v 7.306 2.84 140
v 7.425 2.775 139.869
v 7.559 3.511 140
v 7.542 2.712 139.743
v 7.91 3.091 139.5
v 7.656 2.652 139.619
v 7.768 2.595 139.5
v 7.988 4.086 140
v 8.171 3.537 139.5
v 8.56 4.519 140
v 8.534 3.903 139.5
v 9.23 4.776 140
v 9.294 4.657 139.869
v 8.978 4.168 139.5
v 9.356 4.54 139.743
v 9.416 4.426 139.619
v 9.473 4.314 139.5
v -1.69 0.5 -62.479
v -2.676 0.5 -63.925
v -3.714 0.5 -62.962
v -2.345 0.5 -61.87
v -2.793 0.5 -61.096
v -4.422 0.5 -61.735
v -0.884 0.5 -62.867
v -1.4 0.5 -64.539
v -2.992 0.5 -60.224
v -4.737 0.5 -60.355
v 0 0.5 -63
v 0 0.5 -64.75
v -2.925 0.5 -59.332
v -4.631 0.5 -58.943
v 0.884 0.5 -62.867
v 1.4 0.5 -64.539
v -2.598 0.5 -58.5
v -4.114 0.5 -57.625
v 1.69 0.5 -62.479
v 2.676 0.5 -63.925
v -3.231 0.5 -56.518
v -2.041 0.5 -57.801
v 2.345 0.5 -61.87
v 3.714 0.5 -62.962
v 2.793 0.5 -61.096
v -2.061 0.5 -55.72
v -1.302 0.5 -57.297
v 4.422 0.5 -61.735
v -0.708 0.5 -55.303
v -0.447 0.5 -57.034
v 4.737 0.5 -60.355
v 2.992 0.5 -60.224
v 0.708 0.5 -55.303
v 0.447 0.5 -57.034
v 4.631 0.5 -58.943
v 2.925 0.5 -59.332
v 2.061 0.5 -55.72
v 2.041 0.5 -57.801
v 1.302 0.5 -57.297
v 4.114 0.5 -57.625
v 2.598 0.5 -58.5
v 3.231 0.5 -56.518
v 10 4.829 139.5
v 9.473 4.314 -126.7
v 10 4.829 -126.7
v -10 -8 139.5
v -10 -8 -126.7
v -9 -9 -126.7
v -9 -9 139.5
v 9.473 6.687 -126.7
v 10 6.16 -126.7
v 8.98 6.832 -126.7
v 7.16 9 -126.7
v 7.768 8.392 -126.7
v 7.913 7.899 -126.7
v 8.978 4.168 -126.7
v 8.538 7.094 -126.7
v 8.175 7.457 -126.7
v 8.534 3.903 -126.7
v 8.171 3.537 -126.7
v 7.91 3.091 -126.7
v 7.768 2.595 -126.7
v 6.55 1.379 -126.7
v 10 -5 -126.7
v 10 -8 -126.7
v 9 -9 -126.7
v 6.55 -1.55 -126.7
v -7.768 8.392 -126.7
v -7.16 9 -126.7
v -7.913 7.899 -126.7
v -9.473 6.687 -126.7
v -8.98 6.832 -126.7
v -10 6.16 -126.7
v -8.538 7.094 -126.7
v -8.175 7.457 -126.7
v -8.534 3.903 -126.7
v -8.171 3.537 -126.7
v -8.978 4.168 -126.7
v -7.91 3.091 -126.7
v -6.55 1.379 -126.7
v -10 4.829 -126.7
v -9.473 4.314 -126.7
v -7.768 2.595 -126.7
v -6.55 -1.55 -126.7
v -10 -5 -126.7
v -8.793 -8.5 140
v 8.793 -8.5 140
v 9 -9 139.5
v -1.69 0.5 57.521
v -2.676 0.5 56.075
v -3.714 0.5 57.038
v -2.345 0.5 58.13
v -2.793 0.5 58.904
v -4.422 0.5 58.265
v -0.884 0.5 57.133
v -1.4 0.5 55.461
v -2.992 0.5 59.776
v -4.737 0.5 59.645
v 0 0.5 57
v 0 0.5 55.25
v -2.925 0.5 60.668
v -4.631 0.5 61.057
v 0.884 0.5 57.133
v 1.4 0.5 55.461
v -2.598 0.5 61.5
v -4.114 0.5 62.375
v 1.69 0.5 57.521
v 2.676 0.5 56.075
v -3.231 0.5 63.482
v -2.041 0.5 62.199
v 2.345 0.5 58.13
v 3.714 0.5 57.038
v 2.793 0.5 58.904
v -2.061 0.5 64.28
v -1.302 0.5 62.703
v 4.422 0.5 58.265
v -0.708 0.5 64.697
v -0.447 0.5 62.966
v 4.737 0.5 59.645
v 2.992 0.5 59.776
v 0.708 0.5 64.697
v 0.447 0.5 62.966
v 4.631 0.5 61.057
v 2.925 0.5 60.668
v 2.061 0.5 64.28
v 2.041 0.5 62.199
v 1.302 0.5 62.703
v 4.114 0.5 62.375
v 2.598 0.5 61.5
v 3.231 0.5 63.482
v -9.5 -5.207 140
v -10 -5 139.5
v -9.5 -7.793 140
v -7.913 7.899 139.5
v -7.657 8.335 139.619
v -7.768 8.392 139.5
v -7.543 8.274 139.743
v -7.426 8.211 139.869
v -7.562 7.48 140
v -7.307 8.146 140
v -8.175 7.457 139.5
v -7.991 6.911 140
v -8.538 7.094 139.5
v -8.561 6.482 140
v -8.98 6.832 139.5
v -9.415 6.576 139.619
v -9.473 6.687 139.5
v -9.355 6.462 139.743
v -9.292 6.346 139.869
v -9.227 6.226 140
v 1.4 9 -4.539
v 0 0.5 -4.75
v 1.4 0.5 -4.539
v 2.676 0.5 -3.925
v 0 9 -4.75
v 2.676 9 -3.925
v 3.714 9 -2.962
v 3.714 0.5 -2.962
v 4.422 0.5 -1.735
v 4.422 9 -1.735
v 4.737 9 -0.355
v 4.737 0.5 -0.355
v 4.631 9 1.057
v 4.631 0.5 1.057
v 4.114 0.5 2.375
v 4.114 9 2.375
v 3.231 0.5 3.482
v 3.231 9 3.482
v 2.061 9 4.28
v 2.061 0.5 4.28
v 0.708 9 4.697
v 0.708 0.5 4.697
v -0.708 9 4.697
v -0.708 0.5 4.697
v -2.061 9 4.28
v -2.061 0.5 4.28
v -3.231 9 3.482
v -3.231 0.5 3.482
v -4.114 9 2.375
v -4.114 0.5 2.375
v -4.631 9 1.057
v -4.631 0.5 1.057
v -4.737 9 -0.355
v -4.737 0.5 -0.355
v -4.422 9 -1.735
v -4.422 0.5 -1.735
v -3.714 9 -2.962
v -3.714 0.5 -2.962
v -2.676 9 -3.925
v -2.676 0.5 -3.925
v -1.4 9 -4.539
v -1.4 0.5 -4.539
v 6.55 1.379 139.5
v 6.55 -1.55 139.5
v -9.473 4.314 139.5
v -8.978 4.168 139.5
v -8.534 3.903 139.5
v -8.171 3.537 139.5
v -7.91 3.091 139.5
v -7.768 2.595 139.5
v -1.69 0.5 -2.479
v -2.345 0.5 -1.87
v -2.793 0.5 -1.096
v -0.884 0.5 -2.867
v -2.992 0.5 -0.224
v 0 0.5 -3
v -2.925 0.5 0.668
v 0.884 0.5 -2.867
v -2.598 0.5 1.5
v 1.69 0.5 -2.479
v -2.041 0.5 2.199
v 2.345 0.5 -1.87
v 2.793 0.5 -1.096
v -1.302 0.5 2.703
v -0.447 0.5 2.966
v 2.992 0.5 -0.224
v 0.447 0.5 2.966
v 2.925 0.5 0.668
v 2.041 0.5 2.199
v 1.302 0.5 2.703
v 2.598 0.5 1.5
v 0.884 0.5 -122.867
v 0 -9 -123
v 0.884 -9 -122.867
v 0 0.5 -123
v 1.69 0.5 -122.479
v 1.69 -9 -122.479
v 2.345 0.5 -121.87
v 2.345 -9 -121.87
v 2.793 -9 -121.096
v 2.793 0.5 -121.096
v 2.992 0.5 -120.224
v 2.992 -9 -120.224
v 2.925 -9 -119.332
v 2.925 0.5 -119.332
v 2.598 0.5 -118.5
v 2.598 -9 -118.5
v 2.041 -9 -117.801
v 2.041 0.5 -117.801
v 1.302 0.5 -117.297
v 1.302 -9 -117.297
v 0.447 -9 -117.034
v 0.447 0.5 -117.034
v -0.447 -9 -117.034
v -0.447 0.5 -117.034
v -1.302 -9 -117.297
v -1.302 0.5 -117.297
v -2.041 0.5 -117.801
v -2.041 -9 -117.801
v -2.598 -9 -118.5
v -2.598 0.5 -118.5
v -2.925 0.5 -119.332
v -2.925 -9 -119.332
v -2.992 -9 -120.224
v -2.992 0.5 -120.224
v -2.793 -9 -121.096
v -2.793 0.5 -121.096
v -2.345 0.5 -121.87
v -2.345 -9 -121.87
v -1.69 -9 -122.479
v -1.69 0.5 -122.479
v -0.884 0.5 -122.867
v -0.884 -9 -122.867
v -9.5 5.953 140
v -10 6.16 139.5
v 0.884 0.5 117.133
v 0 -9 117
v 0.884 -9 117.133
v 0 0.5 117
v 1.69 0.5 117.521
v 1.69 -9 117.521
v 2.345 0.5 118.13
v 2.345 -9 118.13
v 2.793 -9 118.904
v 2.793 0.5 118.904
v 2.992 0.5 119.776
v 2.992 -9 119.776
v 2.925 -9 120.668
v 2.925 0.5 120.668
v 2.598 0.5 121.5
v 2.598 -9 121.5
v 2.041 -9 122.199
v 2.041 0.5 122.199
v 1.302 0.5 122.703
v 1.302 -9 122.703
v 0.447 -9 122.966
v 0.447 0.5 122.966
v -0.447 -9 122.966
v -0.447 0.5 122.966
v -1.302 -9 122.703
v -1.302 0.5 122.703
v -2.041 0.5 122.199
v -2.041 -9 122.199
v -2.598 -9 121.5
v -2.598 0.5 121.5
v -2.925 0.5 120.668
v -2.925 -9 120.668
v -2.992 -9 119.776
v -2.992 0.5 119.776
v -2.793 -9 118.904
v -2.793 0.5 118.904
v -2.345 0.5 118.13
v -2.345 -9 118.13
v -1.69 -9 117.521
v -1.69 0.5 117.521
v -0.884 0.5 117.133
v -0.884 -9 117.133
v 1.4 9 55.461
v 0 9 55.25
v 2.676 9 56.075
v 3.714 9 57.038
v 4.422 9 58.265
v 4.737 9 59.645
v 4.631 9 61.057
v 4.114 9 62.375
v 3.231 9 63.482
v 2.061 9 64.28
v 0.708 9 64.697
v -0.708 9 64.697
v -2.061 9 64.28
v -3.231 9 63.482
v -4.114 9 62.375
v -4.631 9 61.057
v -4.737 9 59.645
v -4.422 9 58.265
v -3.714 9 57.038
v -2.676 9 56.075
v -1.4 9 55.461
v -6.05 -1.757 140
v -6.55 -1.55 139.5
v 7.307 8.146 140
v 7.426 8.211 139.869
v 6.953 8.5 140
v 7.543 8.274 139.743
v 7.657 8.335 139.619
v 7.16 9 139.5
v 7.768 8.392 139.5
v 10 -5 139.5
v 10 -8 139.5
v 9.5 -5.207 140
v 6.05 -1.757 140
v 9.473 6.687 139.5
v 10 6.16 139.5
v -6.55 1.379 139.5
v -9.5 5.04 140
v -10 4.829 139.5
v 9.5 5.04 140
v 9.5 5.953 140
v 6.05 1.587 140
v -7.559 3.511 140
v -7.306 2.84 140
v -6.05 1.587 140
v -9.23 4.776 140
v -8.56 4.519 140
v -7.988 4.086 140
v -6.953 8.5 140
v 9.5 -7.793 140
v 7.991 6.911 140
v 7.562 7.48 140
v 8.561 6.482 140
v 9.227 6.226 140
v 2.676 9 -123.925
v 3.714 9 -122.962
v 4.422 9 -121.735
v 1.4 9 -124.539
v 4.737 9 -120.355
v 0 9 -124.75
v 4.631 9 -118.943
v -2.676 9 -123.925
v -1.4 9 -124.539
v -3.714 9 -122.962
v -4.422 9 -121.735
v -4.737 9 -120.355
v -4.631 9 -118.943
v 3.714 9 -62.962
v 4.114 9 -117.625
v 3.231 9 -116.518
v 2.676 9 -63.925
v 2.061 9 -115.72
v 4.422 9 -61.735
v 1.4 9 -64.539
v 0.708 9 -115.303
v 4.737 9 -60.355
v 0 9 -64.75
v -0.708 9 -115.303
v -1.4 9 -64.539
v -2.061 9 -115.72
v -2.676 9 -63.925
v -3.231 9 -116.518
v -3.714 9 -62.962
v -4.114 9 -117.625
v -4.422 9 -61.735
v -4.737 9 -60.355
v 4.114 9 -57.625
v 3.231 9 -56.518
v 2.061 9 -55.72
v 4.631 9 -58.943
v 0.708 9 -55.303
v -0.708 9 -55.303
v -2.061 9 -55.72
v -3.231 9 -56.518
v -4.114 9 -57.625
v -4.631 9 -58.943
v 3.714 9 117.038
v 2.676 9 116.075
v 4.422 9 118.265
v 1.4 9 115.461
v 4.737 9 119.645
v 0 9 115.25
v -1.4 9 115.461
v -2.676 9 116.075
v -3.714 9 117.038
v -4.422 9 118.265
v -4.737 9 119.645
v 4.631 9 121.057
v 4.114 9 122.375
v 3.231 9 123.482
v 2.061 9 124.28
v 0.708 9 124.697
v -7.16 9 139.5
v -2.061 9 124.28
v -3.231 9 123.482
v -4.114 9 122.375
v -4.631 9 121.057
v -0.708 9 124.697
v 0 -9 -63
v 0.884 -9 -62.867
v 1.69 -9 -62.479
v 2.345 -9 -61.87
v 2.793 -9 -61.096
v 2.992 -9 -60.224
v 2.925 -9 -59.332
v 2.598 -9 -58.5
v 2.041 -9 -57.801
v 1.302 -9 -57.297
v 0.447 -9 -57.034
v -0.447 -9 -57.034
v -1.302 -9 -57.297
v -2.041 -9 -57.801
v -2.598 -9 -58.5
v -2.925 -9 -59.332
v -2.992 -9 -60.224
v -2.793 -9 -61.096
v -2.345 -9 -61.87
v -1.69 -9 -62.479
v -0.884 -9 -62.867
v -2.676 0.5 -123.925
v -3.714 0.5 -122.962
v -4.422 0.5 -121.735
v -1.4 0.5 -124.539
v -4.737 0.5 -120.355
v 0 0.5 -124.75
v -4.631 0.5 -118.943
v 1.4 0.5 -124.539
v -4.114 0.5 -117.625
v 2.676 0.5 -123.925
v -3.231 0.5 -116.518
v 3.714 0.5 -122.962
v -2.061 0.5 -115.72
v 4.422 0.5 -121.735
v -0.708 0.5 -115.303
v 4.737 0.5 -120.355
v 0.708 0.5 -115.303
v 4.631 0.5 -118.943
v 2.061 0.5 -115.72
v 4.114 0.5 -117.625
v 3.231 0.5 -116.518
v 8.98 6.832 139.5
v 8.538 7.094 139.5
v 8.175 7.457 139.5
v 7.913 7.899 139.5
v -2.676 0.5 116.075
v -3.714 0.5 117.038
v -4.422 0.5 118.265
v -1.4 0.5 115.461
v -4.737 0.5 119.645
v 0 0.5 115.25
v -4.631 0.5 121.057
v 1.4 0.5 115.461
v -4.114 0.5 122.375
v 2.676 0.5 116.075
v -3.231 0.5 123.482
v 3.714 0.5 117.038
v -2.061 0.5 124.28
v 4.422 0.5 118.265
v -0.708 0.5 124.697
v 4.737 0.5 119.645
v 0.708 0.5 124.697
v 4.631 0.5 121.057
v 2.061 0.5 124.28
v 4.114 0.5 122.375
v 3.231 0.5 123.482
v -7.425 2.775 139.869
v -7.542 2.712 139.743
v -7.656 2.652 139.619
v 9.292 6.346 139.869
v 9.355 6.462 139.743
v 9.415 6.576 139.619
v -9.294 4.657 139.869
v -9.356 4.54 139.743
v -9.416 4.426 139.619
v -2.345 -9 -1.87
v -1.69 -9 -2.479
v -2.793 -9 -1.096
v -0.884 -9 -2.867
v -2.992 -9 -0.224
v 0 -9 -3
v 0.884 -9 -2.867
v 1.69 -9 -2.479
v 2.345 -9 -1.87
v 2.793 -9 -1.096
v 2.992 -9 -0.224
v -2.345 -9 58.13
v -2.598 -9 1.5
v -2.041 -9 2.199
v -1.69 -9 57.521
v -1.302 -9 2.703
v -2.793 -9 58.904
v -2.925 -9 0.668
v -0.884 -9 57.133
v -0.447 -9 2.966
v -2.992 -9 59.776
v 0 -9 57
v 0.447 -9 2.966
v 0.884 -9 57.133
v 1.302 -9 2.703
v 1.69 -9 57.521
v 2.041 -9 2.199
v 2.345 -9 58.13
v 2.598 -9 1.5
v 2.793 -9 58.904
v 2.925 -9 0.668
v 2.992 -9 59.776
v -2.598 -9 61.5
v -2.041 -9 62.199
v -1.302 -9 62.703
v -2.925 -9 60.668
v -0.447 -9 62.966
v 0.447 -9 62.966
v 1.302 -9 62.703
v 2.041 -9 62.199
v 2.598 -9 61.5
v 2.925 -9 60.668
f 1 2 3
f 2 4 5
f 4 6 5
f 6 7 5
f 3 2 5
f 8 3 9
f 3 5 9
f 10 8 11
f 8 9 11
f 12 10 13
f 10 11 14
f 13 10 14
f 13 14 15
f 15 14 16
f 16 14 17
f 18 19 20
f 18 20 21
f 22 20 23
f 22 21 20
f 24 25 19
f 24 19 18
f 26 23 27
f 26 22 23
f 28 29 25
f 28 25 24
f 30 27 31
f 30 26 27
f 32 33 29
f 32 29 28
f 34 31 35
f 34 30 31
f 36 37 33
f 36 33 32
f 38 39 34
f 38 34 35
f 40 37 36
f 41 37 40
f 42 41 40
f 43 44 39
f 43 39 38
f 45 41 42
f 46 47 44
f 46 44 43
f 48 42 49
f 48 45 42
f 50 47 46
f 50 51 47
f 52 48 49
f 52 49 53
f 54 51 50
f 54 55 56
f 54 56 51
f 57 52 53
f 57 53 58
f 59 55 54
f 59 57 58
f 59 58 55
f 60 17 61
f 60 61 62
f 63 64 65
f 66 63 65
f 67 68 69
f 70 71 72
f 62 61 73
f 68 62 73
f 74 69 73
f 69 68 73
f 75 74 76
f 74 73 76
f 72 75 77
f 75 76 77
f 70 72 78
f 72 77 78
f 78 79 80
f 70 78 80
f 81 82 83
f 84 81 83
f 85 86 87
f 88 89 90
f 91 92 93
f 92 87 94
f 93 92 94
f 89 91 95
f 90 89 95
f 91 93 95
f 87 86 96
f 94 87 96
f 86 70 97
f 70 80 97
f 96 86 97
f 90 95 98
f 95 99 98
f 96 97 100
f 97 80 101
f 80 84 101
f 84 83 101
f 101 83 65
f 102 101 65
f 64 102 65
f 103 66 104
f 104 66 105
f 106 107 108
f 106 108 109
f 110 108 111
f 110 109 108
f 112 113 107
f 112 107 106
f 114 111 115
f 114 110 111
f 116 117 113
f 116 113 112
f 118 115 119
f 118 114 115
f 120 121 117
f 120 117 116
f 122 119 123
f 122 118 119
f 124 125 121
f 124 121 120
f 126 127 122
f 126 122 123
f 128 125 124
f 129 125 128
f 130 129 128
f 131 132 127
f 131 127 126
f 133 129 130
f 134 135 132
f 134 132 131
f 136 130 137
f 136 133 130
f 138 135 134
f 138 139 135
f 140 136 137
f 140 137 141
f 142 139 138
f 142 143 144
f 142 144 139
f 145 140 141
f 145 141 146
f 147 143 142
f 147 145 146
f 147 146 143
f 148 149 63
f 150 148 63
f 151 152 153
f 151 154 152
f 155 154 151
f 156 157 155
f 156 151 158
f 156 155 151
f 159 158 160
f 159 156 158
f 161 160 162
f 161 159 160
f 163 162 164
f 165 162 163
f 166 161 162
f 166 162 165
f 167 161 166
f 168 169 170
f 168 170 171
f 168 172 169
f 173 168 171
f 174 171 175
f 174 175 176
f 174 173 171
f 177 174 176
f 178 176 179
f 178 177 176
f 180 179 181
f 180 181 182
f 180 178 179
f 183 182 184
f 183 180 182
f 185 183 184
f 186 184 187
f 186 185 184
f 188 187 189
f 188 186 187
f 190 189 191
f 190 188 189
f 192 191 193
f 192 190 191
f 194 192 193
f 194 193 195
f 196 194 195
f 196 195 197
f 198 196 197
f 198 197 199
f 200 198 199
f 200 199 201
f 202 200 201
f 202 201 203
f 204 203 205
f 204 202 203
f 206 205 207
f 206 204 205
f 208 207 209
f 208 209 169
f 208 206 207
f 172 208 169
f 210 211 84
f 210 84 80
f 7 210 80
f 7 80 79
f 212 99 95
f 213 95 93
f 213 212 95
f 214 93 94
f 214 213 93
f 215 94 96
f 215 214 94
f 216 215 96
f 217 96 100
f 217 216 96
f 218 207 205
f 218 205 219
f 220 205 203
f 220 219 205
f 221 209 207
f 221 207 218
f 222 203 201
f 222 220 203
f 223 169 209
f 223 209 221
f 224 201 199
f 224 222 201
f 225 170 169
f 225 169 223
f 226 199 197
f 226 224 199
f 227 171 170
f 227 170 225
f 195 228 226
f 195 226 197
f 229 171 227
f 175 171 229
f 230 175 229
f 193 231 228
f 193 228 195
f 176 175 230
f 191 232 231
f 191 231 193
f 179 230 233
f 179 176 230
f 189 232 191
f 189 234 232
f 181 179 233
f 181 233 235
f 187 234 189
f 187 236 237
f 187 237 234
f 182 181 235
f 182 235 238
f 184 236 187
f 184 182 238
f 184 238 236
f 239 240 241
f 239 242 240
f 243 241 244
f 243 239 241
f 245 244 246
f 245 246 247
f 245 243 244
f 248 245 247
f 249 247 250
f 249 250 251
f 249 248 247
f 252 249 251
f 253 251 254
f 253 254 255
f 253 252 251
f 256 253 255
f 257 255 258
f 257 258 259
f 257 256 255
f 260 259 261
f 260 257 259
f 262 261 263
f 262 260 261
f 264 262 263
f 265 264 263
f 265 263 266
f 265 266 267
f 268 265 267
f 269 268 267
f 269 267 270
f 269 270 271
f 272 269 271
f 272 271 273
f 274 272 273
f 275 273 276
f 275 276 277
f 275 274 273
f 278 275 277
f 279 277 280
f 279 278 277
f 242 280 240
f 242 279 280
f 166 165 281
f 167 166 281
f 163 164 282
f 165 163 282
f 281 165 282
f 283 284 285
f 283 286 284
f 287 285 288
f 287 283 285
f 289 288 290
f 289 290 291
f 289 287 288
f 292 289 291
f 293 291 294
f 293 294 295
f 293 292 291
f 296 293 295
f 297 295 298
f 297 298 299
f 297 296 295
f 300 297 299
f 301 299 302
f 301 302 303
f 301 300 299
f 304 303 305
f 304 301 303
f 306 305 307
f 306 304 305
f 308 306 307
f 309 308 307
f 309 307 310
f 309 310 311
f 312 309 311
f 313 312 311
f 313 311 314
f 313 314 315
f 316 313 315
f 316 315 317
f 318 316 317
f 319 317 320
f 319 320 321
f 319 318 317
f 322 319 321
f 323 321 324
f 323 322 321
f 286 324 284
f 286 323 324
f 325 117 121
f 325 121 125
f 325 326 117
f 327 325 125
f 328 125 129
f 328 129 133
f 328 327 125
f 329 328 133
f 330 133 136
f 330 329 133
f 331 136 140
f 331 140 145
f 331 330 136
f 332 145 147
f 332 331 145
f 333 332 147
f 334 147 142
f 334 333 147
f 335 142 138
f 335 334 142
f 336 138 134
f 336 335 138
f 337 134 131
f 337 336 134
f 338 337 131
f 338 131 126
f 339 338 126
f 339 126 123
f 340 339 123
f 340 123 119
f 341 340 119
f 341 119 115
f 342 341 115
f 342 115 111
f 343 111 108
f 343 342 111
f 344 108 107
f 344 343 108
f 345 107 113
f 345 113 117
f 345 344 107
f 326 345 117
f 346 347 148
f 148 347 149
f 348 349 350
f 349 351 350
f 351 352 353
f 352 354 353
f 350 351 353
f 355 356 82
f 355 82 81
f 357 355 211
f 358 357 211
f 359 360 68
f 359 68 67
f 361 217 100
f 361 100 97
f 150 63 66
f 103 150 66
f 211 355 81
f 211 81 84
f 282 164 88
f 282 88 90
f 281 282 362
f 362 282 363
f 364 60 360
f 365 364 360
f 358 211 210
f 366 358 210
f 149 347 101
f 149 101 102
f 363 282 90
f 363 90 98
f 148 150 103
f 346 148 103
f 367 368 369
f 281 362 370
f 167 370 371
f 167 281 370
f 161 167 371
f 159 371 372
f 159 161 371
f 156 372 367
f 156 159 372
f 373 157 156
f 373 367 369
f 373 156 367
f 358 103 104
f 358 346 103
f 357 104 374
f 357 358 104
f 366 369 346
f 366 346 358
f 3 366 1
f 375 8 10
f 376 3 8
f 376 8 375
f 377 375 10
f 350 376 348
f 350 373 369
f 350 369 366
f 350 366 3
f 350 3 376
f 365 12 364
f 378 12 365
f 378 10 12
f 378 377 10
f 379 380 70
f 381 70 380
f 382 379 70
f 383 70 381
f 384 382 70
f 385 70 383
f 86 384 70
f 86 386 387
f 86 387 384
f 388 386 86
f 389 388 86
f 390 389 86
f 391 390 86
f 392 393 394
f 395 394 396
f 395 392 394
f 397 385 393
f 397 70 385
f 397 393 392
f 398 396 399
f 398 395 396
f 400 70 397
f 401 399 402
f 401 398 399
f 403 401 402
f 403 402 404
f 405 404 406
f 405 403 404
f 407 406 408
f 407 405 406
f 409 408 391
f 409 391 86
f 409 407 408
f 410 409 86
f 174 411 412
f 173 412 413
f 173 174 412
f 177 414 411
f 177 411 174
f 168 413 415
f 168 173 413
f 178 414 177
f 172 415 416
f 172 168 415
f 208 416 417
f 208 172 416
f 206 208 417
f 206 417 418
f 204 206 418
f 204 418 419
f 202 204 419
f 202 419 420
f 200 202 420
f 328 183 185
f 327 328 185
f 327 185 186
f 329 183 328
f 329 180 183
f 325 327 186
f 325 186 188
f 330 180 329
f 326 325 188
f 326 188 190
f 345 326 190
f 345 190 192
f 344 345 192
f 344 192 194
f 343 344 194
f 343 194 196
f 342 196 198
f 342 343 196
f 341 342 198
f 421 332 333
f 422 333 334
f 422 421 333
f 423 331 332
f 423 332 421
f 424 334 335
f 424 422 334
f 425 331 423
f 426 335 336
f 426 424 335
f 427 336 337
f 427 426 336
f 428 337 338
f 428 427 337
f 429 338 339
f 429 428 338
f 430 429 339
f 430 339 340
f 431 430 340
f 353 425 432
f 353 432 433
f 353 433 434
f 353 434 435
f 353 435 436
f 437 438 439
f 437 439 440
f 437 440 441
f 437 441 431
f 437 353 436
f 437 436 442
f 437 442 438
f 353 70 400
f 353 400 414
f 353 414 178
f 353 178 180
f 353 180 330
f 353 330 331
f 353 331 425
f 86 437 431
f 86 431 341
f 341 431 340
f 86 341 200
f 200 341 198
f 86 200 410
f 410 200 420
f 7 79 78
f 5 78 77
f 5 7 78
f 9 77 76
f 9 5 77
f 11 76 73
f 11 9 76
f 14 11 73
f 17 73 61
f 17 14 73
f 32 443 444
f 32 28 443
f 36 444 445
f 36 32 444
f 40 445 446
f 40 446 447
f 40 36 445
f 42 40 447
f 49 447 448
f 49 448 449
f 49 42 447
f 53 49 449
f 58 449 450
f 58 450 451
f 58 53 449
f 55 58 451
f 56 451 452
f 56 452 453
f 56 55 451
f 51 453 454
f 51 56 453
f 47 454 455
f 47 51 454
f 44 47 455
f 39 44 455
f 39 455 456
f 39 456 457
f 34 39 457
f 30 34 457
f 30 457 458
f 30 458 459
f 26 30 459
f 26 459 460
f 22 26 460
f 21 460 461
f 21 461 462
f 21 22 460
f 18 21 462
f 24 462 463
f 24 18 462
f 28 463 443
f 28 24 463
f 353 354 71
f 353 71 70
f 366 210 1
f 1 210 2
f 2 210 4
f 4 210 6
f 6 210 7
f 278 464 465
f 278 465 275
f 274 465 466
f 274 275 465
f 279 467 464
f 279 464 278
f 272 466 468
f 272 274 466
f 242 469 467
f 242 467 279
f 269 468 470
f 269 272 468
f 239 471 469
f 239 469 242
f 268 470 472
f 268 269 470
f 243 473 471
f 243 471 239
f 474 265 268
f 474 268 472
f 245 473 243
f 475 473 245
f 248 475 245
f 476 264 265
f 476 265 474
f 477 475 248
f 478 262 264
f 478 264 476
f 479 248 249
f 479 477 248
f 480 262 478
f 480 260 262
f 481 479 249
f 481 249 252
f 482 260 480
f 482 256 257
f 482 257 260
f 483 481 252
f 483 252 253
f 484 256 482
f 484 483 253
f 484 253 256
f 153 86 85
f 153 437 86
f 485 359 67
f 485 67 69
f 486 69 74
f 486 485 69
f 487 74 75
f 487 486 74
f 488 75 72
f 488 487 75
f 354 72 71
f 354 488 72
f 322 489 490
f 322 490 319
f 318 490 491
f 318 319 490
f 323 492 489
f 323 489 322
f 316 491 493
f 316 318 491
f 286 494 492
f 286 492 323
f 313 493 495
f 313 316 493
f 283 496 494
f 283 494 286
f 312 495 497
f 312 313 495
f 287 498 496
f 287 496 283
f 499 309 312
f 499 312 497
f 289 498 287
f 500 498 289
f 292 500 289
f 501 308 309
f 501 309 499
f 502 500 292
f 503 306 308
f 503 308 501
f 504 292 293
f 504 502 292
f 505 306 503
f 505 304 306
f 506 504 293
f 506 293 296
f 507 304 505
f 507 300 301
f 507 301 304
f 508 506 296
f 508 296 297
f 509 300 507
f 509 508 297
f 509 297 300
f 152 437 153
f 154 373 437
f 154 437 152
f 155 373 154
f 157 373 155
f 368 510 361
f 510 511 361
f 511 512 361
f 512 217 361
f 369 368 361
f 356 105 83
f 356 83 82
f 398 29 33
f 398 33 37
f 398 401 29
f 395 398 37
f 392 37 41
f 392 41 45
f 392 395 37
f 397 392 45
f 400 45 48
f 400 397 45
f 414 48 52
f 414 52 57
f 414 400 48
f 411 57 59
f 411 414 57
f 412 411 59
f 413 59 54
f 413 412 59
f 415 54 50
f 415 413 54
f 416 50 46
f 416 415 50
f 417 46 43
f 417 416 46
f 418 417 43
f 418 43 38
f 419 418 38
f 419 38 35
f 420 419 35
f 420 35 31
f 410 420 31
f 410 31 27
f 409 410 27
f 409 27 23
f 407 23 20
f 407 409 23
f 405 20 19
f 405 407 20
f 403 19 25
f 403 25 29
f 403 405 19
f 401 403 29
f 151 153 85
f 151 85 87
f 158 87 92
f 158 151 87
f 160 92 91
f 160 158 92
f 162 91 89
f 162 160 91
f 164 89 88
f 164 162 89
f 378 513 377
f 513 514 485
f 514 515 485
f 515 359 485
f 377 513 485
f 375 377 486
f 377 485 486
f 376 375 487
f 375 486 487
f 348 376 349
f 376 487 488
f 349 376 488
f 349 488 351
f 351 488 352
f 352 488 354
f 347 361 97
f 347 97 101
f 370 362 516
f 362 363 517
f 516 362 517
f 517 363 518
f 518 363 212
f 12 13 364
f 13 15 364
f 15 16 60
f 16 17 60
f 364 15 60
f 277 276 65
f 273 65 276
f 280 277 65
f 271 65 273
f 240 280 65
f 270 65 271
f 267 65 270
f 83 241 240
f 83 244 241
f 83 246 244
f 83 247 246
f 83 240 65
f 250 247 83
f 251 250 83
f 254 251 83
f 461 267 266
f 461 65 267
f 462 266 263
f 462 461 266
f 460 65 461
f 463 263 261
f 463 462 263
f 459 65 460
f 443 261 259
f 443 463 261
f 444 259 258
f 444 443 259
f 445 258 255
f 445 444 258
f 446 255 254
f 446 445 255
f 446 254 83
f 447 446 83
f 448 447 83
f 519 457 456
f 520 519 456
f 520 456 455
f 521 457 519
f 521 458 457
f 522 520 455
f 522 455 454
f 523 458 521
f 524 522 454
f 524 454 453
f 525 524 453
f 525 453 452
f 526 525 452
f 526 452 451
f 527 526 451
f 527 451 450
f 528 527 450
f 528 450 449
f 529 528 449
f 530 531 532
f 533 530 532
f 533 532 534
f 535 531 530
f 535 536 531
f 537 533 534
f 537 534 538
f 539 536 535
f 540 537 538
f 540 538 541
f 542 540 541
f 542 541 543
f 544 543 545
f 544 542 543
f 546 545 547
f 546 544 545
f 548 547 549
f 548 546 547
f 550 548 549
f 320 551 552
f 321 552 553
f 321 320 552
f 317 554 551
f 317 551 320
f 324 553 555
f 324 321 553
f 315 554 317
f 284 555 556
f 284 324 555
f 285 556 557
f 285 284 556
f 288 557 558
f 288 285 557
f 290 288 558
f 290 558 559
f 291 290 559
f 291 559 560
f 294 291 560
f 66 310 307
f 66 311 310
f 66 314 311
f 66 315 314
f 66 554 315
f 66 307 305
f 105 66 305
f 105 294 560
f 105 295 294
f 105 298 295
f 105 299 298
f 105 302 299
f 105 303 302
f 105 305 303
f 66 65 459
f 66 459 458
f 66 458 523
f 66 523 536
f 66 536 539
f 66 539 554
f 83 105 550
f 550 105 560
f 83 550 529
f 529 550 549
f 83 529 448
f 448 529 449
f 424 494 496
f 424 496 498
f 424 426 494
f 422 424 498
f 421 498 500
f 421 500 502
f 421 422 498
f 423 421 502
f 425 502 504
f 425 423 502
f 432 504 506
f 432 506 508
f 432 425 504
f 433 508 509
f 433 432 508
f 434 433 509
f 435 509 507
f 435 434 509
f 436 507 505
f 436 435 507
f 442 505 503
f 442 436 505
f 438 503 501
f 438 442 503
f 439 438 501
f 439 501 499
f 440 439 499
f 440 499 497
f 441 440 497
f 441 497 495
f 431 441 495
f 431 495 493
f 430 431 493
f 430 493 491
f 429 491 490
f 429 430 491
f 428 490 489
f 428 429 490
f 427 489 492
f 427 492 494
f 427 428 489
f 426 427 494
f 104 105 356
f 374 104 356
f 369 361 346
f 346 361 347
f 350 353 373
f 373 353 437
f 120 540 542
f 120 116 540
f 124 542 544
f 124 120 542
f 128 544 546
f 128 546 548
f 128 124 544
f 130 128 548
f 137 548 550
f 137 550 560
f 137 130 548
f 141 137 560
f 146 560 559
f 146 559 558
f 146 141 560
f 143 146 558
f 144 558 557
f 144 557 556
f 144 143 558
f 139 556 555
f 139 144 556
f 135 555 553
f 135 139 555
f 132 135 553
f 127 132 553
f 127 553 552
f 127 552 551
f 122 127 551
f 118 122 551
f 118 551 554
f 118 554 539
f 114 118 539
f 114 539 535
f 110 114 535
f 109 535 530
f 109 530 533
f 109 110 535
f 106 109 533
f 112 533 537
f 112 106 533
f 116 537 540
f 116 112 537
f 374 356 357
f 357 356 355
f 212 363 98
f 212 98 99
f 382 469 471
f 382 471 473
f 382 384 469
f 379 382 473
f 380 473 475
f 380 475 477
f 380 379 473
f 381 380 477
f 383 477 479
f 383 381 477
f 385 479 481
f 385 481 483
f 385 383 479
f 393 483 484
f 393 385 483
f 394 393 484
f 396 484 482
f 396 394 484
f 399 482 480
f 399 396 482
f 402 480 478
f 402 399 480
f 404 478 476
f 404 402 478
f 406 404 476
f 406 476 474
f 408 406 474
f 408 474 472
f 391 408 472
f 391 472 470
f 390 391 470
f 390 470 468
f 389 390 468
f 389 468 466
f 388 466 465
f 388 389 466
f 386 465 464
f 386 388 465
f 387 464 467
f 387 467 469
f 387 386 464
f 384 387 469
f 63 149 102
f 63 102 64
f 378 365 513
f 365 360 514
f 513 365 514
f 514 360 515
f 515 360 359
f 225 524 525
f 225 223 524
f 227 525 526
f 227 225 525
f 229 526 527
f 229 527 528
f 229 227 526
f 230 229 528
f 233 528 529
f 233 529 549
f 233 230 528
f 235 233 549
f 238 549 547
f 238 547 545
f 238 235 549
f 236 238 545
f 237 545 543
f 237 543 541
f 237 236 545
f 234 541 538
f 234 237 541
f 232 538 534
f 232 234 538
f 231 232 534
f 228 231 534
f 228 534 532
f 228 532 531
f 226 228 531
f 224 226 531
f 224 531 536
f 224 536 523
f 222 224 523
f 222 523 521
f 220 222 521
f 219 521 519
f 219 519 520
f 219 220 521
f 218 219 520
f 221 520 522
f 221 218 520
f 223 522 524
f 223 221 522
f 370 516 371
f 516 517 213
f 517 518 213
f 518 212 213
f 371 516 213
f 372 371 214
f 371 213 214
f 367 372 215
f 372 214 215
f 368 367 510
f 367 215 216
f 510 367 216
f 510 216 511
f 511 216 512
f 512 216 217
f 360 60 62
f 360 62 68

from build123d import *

# Parameters (mm, degrees)
BOSS_EXTRUDE1_DEPTH      = 140
BOSS_EXTRUDE1_DEPTH_BACK = 140
LPATTERN2_COUNT          = 5
LPATTERN2_PITCH          = 60
CHAMFER1_SIZE            = 0.5
CUT_EXTRUDE1_DEPTH       = 1
CUT_EXTRUDE1_DEPTH_BACK  = 19


with BuildPart() as part:
    # Sketch3 → Boss-Extrude1 (new body, two sides)
    with BuildSketch(Plane.XY) as boss_extrude1_sk:
        with BuildLine():
            Line((3, 9), (-3, 9))
            Line((-3, 9), (-7.160036564, 9))
            Line((-7.160036564, 9), (-7.767930373, 8.392105714))
            ThreePointArc((-7.767930373, 8.392105714), (-8.344874488, 7.264307267), (-9.472673258, 6.687363783))
            Line((-9.472673258, 6.687363783), (-10, 6.160037041))
            Line((-10, 6.160037041), (-10, 4.82918644))
            Line((-10, 4.82918644), (-9.472673258, 4.314376637))
            ThreePointArc((-9.472673258, 4.314376637), (-8.341068744, 3.731631743), (-7.767930373, 2.595131504))
            Line((-7.767930373, 2.595131504), (-6.550048828, 1.379235268))
            Line((-6.550048828, 1.379235268), (-6.550048828, -1.550048828))
            Line((-6.550048828, -1.550048828), (-10, -4.999922752))
            Line((-10, -4.999922752), (-10, -8))
            Line((-10, -8), (-9, -9))
            Line((-9, -9), (0, -9))
            Line((0, -9), (9, -9))
            Line((9, -9), (10, -8))
            Line((10, -8), (10, -4.999922752))
            Line((10, -4.999922752), (6.550048828, -1.550048828))
            Line((6.550048828, -1.550048828), (6.550048828, 1.379235268))
            Line((6.550048828, 1.379235268), (7.767930373, 2.595131504))
            ThreePointArc((7.767930373, 2.595131504), (8.341068744, 3.731631743), (9.472673258, 4.314376637))
            Line((9.472673258, 4.314376637), (10, 4.82918644))
            Line((10, 4.82918644), (10, 6.160037041))
            Line((10, 6.160037041), (9.472673258, 6.687363783))
            ThreePointArc((9.472673258, 6.687363783), (8.344874488, 7.264307267), (7.767930373, 8.392105714))
            Line((7.767930373, 8.392105714), (7.160036564, 9))
            Line((7.160036564, 9), (3, 9))
        make_face()
    extrude(amount=BOSS_EXTRUDE1_DEPTH)
    extrude(boss_extrude1_sk.sketch, amount=-BOSS_EXTRUDE1_DEPTH_BACK)

    # Sketch4 → Cut-Revolve1 (revolve, cut)
    with BuildSketch(Plane(origin=(0, 0, 0), x_dir=(0, 0, -1), z_dir=(1, 0, 0))):
        Polygon((-115.25, 9), (-120, 9), (-120, -9), (-117, -9), (-117, 0.5), (-115.25, 0.5), align=None)
    cut_revolve1 = revolve(axis=Axis((0, 9, 120), (0, -1, 0)), mode=Mode.SUBTRACT)

    # LPattern2: Cut-Revolve1 ×5
    with Locations(*[(0, 0, -i * LPATTERN2_PITCH) for i in range(1, LPATTERN2_COUNT)]):
        add(cut_revolve1, mode=Mode.SUBTRACT)

    # Chamfer1
    chamfer1_edges = [part.edges().sort_by_distance(p)[0] for p in [
        (-6.550048828, -0.08540678, 140),
        (-8.275024414, -3.27498579, 140),
        (-10, -6.499961376, 140),
        (-9.5, -8.5, 140),
        (0, -9, 140),
        (9.5, -8.5, 140),
        (10, -6.499961376, 140),
        (8.275024414, -3.27498579, 140),
        (6.550048828, -0.08540678, 140),
        (-8.341068744, 3.731631743, 140),
        (7.158989601, 1.987183386, 140),
        (8.341068744, 3.731631743, 140),
        (9.736336629, 4.571781538, 140),
        (-9.736336629, 4.571781538, -140),
        (-10, 5.49461174, -140),
        (10, 5.49461174, 140),
        (-9.736336629, 6.423700412, -140),
        (-7.463983469, 8.696052857, -140),
        (0, 9, -140),
        (7.463983469, 8.696052857, -140),
        (9.736336629, 6.423700412, -140),
        (10, 5.49461174, -140),
        (9.736336629, 6.423700412, 140),
        (9.736336629, 4.571781538, -140),
        (7.158989601, 1.987183386, -140),
        (6.550048828, -0.08540678, -140),
        (8.275024414, -3.27498579, -140),
        (10, -6.499961376, -140),
        (9.5, -8.5, -140),
        (0, -9, -140),
        (8.344874488, 7.264307267, 140),
        (-9.5, -8.5, -140),
        (-10, -6.499961376, -140),
        (-8.275024414, -3.27498579, -140),
        (-6.550048828, -0.08540678, -140),
        (-7.158989601, 1.987183386, -140),
        (-8.341068744, 3.731631743, -140),
        (-8.344874488, 7.264307267, -140),
        (8.344874488, 7.264307267, -140),
        (8.341068744, 3.731631743, -140),
        (7.463983469, 8.696052857, 140),
        (0, 9, 140),
        (-7.463983469, 8.696052857, 140),
        (-8.344874488, 7.264307267, 140),
        (-7.158989601, 1.987183386, 140),
        (-9.736336629, 6.423700412, 140),
        (-10, 5.49461174, 140),
        (-9.736336629, 4.571781538, 140),
    ]]
    chamfer(chamfer1_edges, length=CHAMFER1_SIZE)

    # Sketch7 → Cut-Extrude1 (cut, two sides)
    with BuildSketch(Plane.XZ.offset(9)) as cut_extrude1_sk:
        Polygon((563.970585521, -126.7), (15.689992686, -126.7), (-26.160878802, -126.7), (-574.441471637, -126.7), (-574.441471637, -1223.26118567), (563.970585521, -1223.26118567), align=None)
    extrude(amount=CUT_EXTRUDE1_DEPTH, mode=Mode.SUBTRACT)
    extrude(cut_extrude1_sk.sketch, amount=-CUT_EXTRUDE1_DEPTH_BACK, mode=Mode.SUBTRACT)


solid = part.part
